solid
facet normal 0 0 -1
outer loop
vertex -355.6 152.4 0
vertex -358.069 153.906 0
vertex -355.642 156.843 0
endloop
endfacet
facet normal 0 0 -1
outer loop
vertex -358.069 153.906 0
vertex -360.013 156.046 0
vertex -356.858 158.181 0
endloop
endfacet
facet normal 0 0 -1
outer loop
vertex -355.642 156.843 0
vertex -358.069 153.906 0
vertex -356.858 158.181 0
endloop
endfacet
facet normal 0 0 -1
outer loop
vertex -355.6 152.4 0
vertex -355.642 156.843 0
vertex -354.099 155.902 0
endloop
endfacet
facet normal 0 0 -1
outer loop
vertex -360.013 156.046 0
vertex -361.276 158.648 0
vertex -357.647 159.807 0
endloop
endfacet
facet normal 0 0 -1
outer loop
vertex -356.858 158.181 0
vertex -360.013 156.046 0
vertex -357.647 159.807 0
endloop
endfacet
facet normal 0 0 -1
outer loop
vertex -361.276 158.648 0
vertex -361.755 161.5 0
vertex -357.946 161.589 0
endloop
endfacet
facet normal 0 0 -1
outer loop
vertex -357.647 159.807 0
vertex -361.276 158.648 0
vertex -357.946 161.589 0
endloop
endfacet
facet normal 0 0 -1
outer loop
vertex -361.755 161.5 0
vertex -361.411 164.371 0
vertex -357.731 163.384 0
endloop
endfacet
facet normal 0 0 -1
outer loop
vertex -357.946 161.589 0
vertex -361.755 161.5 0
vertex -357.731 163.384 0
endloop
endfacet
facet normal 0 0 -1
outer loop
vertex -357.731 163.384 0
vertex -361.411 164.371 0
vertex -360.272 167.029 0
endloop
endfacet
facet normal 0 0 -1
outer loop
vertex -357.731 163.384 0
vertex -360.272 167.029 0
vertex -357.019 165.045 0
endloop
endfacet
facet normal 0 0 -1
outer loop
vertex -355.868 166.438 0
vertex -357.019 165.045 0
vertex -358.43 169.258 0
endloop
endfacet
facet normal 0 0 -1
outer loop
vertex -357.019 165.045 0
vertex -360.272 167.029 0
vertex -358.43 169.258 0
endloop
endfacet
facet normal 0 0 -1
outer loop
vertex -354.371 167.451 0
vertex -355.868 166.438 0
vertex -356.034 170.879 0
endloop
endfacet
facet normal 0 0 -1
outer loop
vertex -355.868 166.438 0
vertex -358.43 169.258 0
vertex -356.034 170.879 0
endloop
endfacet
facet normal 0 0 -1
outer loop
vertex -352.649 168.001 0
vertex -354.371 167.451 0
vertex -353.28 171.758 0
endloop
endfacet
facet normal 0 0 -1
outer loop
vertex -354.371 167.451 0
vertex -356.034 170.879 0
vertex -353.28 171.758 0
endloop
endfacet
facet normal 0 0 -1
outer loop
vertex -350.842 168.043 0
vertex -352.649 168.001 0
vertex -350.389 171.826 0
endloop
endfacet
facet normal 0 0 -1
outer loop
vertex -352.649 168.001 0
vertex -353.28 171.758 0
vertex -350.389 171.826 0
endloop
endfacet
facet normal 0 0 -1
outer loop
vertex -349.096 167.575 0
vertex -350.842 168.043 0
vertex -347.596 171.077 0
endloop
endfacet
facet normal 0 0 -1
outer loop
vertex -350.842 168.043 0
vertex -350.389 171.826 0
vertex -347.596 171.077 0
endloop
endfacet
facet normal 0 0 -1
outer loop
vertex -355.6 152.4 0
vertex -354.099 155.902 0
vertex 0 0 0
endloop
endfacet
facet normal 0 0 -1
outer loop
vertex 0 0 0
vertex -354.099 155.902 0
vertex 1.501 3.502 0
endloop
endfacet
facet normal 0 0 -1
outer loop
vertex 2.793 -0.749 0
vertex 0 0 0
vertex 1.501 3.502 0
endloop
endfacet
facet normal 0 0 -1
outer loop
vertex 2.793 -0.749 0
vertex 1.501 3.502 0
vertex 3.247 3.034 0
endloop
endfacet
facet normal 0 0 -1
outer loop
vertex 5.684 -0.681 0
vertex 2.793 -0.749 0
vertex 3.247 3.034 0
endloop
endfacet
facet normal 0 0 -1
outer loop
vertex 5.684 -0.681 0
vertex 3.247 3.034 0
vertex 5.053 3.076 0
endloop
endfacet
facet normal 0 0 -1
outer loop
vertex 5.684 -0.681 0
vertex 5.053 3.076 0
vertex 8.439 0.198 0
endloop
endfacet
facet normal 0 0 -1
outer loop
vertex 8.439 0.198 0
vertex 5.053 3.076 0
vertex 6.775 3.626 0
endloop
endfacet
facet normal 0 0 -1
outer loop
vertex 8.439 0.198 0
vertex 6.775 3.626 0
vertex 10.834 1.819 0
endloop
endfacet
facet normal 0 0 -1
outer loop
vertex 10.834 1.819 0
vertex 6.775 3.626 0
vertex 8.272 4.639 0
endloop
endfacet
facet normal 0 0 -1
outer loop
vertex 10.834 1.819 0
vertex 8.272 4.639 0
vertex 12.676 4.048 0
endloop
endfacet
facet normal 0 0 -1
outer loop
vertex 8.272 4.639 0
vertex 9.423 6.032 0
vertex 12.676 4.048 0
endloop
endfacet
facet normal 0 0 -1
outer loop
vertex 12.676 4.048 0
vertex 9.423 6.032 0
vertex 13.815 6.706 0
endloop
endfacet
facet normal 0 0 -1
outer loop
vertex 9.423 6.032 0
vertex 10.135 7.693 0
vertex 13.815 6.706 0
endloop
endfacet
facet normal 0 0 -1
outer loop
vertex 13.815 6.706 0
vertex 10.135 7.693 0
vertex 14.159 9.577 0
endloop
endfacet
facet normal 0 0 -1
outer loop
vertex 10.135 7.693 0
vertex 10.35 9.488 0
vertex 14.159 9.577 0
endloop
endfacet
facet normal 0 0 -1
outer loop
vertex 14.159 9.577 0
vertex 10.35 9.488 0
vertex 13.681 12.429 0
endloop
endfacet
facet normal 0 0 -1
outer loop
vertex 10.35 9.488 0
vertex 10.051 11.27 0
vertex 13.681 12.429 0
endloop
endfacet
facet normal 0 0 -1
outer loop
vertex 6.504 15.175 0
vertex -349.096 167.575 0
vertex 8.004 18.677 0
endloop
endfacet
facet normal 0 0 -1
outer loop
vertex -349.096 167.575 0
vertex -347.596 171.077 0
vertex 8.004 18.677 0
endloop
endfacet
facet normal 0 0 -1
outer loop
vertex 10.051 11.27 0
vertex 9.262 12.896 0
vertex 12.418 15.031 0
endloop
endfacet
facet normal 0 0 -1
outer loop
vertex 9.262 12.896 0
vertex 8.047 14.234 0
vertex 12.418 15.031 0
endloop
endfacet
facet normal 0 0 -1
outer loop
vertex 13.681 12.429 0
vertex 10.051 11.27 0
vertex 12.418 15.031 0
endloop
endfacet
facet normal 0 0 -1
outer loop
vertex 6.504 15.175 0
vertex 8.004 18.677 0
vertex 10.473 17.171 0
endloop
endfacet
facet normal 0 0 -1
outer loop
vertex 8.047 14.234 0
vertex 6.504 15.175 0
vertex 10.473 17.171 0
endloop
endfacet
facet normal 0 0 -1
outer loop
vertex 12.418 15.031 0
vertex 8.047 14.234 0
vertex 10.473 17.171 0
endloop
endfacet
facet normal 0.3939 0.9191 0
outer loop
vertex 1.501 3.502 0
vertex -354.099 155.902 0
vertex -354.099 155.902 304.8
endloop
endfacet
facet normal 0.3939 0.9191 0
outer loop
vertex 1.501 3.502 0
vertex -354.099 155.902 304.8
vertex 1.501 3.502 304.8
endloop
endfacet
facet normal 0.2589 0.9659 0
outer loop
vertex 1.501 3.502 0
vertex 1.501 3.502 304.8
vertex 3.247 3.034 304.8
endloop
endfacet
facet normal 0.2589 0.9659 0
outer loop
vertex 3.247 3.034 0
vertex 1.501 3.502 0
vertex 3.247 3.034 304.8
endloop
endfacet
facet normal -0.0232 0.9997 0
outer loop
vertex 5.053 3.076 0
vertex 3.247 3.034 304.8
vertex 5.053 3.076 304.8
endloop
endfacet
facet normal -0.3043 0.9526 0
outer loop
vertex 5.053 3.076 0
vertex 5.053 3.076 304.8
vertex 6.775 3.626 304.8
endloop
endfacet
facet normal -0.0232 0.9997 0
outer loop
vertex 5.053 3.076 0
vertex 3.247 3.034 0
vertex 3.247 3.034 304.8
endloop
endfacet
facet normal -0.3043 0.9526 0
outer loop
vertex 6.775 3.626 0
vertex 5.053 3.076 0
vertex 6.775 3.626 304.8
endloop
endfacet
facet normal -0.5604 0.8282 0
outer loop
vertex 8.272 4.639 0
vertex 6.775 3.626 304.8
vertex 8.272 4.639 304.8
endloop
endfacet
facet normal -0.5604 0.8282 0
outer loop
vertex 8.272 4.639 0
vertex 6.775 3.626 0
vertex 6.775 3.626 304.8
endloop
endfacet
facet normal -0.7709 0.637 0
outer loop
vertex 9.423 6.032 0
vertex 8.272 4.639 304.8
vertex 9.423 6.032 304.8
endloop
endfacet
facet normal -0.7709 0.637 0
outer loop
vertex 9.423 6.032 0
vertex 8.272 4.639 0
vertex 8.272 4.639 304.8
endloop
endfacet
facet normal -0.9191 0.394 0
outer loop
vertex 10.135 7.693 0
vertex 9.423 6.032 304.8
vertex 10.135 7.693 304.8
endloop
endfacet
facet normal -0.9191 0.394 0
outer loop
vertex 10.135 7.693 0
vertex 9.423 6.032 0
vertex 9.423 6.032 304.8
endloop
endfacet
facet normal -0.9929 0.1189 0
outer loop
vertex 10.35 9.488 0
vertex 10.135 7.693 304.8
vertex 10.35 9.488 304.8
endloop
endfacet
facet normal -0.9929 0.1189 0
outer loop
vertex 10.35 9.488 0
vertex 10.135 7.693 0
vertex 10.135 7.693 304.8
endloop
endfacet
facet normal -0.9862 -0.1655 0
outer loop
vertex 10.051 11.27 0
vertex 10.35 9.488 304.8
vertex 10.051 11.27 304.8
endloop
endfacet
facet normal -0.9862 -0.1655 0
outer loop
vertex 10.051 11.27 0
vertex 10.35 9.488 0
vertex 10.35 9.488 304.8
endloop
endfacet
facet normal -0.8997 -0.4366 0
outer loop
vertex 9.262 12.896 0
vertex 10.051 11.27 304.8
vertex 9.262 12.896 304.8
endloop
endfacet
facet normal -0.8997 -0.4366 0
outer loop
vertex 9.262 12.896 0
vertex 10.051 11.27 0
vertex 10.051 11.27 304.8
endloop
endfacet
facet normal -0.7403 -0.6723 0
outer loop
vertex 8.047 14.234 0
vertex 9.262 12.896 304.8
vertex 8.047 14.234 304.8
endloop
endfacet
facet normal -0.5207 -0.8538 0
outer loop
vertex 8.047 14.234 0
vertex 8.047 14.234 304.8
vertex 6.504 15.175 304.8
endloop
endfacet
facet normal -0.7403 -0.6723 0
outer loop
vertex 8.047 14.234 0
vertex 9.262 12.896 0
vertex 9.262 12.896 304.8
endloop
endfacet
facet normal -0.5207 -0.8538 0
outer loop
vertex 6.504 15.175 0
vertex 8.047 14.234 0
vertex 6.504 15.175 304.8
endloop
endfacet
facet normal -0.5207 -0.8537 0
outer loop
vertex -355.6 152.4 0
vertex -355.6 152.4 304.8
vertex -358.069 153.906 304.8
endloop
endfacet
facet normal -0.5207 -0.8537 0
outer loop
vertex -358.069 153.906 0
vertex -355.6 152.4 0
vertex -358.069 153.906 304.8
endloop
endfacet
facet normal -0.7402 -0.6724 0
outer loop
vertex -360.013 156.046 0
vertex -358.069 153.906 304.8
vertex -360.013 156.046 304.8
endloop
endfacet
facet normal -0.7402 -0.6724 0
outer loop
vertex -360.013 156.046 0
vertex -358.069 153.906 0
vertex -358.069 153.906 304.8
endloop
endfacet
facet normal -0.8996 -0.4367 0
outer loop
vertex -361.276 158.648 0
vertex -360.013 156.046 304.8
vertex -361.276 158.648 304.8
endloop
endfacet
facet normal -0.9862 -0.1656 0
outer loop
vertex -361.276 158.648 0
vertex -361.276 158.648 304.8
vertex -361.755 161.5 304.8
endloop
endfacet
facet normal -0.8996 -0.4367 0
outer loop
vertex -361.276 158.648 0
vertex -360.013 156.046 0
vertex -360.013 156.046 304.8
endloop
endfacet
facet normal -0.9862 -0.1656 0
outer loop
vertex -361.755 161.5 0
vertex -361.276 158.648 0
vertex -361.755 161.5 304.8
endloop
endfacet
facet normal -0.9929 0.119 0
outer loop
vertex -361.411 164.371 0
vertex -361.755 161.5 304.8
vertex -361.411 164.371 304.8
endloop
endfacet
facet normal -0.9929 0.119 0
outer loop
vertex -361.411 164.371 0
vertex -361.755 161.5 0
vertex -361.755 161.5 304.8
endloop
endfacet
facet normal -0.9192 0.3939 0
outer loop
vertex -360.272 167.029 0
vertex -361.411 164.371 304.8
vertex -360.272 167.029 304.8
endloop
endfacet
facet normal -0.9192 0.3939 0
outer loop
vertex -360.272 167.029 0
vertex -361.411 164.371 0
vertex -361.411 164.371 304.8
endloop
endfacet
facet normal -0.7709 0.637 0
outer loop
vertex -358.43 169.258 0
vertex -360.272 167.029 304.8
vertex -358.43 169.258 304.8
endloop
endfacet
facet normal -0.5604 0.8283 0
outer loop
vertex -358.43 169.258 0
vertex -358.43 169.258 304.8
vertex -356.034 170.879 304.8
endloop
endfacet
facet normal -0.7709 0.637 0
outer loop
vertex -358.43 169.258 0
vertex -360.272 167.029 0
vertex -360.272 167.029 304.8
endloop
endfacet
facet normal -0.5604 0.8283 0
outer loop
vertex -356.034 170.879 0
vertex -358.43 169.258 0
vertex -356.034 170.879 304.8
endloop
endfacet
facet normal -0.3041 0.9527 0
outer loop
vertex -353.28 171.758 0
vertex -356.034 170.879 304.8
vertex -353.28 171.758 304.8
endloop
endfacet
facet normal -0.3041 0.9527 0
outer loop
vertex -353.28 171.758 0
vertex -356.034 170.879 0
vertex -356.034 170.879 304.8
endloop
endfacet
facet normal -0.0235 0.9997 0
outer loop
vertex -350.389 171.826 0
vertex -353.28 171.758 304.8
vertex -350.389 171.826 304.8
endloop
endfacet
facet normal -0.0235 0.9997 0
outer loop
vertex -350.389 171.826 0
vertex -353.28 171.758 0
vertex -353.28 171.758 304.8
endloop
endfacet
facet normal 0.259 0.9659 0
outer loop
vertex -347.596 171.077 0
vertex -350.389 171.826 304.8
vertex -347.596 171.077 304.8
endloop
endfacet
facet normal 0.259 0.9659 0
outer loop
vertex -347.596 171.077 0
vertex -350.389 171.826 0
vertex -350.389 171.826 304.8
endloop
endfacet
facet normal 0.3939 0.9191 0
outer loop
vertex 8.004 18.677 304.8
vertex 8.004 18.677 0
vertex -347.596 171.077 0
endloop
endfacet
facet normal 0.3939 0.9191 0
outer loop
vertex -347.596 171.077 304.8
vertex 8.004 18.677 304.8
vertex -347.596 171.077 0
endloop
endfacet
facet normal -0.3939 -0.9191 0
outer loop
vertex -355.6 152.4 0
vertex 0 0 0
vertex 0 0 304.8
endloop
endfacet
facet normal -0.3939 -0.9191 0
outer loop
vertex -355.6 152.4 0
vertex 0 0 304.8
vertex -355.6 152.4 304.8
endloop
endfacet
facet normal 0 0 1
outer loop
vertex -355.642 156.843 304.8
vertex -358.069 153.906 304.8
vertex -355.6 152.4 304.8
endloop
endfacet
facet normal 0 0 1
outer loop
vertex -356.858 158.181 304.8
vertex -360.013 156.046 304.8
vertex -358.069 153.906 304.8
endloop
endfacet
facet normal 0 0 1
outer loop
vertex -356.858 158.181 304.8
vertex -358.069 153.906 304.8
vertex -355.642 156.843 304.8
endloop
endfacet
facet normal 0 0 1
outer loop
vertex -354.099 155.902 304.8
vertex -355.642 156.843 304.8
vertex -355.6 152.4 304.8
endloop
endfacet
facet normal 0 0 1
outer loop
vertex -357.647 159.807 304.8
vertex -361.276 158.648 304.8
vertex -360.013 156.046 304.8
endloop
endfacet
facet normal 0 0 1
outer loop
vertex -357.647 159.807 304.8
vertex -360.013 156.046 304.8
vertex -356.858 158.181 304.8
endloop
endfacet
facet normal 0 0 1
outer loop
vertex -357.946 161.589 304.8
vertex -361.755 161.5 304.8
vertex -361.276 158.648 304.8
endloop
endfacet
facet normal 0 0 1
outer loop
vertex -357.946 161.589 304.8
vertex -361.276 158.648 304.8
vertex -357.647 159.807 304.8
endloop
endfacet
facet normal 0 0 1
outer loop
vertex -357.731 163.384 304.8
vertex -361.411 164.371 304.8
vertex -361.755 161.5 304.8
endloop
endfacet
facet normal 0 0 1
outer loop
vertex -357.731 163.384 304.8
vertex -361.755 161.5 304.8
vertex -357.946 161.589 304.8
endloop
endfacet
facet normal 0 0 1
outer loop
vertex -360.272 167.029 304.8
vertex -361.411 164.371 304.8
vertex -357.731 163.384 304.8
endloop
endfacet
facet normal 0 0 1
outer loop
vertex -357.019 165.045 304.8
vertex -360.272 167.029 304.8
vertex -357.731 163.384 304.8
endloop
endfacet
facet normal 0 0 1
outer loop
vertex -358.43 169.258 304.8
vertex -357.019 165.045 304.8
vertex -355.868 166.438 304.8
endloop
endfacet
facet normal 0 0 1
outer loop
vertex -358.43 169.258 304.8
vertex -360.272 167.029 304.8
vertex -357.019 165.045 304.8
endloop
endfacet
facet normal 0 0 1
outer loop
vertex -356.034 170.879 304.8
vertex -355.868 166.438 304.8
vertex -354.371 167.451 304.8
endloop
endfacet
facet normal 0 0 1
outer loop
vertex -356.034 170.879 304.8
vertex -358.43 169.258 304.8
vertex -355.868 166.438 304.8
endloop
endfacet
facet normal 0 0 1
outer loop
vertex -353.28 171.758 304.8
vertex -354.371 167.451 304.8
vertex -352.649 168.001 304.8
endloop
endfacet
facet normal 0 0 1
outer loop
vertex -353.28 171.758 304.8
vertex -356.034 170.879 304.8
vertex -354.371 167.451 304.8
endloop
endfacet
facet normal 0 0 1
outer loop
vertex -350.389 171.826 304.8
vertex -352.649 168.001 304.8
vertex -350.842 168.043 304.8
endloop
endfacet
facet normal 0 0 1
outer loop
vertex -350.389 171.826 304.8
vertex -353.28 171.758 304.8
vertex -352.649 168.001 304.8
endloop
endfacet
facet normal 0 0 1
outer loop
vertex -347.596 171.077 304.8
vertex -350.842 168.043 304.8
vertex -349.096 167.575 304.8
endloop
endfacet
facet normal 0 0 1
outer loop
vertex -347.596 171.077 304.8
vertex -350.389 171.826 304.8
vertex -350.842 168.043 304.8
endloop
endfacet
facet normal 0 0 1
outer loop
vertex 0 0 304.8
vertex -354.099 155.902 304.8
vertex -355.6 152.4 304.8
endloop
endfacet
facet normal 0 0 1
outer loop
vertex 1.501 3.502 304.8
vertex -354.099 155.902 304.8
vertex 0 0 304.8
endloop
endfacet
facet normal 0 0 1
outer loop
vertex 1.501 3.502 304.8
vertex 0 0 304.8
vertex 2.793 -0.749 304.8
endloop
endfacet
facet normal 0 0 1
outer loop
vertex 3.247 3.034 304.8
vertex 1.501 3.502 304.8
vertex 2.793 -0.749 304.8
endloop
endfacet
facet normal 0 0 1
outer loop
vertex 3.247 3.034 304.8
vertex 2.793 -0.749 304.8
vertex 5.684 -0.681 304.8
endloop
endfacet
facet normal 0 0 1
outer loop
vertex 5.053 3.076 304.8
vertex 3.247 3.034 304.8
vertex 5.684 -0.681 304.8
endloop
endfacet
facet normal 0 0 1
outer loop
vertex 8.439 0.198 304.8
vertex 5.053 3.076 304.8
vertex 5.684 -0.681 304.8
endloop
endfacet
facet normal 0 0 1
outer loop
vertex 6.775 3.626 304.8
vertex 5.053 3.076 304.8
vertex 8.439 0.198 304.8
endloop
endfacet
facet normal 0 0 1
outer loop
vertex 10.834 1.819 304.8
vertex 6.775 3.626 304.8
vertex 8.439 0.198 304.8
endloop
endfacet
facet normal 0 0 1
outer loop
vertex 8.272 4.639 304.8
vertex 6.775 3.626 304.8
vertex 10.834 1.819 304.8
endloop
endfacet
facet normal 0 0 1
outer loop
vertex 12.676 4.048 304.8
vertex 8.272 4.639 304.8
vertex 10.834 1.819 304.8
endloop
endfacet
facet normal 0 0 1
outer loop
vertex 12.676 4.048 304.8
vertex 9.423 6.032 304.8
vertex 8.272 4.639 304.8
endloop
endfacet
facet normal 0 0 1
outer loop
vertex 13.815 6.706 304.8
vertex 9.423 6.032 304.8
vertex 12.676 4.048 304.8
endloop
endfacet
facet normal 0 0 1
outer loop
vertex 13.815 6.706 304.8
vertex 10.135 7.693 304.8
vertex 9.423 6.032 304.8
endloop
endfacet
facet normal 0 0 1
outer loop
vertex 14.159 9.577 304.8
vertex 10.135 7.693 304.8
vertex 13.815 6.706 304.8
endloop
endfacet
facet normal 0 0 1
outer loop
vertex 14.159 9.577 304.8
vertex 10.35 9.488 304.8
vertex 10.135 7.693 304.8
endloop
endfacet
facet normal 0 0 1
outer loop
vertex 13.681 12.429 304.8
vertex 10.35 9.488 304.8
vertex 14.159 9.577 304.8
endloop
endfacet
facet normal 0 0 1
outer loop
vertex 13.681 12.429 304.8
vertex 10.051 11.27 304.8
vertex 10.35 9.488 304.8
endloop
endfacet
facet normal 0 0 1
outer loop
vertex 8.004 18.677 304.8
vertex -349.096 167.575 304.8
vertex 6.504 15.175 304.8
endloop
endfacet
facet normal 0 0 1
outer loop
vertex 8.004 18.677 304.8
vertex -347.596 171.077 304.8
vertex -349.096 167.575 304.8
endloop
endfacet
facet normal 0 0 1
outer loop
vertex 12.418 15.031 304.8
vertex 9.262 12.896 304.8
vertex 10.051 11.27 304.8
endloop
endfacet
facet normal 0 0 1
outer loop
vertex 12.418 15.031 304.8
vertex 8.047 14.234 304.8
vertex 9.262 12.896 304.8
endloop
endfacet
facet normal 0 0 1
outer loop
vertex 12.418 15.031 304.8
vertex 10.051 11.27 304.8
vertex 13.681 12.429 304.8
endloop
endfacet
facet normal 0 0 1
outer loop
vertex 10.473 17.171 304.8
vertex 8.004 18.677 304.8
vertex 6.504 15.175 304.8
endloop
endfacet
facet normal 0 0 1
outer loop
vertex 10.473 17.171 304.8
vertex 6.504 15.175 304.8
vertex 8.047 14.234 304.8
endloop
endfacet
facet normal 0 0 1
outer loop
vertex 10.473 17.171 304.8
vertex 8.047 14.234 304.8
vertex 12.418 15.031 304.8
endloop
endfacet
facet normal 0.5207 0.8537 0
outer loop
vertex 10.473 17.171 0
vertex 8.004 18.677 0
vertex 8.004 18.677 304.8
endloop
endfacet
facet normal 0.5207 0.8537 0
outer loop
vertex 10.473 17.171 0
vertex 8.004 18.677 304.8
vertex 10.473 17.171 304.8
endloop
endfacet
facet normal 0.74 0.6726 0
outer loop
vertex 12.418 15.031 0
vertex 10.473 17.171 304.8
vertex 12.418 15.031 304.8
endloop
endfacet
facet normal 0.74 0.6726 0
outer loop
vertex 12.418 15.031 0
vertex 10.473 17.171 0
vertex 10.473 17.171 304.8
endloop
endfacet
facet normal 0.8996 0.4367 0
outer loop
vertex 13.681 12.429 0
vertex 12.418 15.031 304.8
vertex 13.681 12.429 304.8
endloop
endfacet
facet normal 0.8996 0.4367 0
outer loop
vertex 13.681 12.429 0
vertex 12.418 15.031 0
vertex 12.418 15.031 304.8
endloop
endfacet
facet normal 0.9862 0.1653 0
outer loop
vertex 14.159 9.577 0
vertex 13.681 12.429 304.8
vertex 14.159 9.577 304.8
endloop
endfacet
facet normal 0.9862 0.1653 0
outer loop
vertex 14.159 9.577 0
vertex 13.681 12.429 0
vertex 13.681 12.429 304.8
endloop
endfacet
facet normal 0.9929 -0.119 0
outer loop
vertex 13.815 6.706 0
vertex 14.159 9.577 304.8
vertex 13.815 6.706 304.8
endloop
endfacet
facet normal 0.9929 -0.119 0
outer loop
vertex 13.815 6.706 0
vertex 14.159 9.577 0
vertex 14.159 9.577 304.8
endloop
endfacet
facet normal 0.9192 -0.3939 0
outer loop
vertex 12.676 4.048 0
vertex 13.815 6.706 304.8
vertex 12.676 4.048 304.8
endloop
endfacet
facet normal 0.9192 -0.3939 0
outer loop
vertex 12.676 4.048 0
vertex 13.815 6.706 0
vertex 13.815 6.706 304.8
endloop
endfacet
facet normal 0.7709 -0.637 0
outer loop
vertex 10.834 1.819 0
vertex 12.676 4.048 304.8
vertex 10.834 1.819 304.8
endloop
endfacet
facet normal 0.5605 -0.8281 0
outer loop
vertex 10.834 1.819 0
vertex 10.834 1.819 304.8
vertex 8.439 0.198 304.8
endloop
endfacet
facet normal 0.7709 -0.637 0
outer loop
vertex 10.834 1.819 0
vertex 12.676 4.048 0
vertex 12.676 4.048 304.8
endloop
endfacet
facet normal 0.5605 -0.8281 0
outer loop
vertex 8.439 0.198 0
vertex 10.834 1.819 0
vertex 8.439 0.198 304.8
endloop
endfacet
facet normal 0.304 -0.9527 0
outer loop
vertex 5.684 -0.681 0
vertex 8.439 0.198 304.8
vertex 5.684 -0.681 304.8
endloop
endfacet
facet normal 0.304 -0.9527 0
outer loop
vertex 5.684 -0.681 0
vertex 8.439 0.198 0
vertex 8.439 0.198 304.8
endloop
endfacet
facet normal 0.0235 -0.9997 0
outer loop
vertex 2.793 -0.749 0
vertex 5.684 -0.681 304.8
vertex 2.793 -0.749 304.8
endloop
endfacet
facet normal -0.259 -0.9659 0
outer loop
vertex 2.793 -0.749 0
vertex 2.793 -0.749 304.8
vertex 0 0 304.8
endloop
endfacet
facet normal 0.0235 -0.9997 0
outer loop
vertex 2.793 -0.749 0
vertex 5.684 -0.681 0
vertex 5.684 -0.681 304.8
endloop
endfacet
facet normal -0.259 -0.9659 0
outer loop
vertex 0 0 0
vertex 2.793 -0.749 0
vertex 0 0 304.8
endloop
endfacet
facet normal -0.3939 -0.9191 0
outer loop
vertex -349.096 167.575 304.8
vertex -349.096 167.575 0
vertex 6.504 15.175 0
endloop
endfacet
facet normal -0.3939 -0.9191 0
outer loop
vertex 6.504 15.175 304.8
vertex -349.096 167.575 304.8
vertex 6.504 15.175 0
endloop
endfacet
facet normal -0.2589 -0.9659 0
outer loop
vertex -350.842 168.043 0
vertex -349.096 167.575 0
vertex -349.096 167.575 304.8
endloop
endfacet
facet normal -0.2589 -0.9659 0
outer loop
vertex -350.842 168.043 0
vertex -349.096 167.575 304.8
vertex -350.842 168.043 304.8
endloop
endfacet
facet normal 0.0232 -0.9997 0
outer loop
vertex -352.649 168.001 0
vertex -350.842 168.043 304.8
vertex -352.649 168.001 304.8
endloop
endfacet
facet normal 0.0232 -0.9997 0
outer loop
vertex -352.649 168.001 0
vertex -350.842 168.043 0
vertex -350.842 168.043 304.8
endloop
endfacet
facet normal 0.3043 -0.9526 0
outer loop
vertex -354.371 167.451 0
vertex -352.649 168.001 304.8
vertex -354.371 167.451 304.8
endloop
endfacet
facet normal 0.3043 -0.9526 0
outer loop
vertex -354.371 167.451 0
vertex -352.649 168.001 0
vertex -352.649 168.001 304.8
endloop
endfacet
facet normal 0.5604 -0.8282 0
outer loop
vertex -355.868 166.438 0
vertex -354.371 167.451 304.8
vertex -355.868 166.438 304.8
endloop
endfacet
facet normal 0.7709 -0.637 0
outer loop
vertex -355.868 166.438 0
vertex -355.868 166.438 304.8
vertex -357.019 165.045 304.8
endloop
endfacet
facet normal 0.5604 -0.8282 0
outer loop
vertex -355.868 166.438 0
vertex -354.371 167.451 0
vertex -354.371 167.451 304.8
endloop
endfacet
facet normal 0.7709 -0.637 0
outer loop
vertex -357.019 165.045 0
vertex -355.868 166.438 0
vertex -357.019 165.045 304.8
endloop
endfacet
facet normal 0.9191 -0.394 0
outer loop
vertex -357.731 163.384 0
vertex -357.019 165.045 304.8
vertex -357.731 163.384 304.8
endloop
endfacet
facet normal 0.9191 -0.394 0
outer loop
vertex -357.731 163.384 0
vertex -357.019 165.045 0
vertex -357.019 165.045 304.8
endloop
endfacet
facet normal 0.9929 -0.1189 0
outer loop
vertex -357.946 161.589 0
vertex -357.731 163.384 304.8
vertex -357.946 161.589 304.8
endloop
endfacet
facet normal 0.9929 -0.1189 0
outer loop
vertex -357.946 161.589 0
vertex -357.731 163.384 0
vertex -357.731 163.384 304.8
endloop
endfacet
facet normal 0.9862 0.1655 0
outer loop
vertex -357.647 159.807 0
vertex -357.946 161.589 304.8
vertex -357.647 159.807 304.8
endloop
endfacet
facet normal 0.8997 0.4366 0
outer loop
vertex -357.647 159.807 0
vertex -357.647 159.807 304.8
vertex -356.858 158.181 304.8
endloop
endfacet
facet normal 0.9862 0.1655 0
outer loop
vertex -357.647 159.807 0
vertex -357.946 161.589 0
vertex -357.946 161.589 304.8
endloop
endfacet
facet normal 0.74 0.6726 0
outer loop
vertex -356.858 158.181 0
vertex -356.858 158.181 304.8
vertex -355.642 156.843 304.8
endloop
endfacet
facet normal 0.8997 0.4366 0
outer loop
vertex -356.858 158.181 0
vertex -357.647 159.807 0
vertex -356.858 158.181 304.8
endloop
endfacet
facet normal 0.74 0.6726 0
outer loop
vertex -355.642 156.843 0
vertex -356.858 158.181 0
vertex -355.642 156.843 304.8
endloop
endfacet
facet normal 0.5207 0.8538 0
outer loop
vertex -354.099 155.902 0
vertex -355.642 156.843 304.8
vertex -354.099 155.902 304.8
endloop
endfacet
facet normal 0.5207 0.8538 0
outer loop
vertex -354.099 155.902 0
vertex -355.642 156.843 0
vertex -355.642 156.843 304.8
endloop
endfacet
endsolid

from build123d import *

# Parameters (mm, degrees)
BOSS_EXTRUDE1_DEPTH = 304.8


with BuildPart() as part:
    # Sketch1 → Boss-Extrude1 (new body)
    with BuildSketch(Plane.XY):
        Polygon((-349.09639238, 167.575084446), (6.50360762, 15.175084446), (8.004440147, 18.67702701), (-347.595559853, 171.07702701), align=None)
        Polygon((-354.099167472, 155.901942564), (1.500832528, 3.501942564), (0, 0), (-355.6, 152.4), align=None)
        with BuildLine():
            ThreePointArc((-349.09639238, 167.575084446), (-357.434350867, 164.239901051), (-354.099167472, 155.901942564))
            Line((-354.099167472, 155.901942564), (-355.6, 152.4))
            ThreePointArc((-355.6, 152.4), (-360.936293431, 165.740733579), (-347.595559853, 171.07702701))
            Line((-347.595559853, 171.07702701), (-349.09639238, 167.575084446))
        make_face()
        with BuildLine():
            ThreePointArc((1.500832528, 3.501942564), (9.838791014, 6.837125959), (6.50360762, 15.175084446))
            Line((6.50360762, 15.175084446), (8.004440147, 18.67702701))
            ThreePointArc((8.004440147, 18.67702701), (13.340733579, 5.336293431), (0, 0))
            Line((0, 0), (1.500832528, 3.501942564))
        make_face()
    extrude(amount=BOSS_EXTRUDE1_DEPTH)


solid = part.part
